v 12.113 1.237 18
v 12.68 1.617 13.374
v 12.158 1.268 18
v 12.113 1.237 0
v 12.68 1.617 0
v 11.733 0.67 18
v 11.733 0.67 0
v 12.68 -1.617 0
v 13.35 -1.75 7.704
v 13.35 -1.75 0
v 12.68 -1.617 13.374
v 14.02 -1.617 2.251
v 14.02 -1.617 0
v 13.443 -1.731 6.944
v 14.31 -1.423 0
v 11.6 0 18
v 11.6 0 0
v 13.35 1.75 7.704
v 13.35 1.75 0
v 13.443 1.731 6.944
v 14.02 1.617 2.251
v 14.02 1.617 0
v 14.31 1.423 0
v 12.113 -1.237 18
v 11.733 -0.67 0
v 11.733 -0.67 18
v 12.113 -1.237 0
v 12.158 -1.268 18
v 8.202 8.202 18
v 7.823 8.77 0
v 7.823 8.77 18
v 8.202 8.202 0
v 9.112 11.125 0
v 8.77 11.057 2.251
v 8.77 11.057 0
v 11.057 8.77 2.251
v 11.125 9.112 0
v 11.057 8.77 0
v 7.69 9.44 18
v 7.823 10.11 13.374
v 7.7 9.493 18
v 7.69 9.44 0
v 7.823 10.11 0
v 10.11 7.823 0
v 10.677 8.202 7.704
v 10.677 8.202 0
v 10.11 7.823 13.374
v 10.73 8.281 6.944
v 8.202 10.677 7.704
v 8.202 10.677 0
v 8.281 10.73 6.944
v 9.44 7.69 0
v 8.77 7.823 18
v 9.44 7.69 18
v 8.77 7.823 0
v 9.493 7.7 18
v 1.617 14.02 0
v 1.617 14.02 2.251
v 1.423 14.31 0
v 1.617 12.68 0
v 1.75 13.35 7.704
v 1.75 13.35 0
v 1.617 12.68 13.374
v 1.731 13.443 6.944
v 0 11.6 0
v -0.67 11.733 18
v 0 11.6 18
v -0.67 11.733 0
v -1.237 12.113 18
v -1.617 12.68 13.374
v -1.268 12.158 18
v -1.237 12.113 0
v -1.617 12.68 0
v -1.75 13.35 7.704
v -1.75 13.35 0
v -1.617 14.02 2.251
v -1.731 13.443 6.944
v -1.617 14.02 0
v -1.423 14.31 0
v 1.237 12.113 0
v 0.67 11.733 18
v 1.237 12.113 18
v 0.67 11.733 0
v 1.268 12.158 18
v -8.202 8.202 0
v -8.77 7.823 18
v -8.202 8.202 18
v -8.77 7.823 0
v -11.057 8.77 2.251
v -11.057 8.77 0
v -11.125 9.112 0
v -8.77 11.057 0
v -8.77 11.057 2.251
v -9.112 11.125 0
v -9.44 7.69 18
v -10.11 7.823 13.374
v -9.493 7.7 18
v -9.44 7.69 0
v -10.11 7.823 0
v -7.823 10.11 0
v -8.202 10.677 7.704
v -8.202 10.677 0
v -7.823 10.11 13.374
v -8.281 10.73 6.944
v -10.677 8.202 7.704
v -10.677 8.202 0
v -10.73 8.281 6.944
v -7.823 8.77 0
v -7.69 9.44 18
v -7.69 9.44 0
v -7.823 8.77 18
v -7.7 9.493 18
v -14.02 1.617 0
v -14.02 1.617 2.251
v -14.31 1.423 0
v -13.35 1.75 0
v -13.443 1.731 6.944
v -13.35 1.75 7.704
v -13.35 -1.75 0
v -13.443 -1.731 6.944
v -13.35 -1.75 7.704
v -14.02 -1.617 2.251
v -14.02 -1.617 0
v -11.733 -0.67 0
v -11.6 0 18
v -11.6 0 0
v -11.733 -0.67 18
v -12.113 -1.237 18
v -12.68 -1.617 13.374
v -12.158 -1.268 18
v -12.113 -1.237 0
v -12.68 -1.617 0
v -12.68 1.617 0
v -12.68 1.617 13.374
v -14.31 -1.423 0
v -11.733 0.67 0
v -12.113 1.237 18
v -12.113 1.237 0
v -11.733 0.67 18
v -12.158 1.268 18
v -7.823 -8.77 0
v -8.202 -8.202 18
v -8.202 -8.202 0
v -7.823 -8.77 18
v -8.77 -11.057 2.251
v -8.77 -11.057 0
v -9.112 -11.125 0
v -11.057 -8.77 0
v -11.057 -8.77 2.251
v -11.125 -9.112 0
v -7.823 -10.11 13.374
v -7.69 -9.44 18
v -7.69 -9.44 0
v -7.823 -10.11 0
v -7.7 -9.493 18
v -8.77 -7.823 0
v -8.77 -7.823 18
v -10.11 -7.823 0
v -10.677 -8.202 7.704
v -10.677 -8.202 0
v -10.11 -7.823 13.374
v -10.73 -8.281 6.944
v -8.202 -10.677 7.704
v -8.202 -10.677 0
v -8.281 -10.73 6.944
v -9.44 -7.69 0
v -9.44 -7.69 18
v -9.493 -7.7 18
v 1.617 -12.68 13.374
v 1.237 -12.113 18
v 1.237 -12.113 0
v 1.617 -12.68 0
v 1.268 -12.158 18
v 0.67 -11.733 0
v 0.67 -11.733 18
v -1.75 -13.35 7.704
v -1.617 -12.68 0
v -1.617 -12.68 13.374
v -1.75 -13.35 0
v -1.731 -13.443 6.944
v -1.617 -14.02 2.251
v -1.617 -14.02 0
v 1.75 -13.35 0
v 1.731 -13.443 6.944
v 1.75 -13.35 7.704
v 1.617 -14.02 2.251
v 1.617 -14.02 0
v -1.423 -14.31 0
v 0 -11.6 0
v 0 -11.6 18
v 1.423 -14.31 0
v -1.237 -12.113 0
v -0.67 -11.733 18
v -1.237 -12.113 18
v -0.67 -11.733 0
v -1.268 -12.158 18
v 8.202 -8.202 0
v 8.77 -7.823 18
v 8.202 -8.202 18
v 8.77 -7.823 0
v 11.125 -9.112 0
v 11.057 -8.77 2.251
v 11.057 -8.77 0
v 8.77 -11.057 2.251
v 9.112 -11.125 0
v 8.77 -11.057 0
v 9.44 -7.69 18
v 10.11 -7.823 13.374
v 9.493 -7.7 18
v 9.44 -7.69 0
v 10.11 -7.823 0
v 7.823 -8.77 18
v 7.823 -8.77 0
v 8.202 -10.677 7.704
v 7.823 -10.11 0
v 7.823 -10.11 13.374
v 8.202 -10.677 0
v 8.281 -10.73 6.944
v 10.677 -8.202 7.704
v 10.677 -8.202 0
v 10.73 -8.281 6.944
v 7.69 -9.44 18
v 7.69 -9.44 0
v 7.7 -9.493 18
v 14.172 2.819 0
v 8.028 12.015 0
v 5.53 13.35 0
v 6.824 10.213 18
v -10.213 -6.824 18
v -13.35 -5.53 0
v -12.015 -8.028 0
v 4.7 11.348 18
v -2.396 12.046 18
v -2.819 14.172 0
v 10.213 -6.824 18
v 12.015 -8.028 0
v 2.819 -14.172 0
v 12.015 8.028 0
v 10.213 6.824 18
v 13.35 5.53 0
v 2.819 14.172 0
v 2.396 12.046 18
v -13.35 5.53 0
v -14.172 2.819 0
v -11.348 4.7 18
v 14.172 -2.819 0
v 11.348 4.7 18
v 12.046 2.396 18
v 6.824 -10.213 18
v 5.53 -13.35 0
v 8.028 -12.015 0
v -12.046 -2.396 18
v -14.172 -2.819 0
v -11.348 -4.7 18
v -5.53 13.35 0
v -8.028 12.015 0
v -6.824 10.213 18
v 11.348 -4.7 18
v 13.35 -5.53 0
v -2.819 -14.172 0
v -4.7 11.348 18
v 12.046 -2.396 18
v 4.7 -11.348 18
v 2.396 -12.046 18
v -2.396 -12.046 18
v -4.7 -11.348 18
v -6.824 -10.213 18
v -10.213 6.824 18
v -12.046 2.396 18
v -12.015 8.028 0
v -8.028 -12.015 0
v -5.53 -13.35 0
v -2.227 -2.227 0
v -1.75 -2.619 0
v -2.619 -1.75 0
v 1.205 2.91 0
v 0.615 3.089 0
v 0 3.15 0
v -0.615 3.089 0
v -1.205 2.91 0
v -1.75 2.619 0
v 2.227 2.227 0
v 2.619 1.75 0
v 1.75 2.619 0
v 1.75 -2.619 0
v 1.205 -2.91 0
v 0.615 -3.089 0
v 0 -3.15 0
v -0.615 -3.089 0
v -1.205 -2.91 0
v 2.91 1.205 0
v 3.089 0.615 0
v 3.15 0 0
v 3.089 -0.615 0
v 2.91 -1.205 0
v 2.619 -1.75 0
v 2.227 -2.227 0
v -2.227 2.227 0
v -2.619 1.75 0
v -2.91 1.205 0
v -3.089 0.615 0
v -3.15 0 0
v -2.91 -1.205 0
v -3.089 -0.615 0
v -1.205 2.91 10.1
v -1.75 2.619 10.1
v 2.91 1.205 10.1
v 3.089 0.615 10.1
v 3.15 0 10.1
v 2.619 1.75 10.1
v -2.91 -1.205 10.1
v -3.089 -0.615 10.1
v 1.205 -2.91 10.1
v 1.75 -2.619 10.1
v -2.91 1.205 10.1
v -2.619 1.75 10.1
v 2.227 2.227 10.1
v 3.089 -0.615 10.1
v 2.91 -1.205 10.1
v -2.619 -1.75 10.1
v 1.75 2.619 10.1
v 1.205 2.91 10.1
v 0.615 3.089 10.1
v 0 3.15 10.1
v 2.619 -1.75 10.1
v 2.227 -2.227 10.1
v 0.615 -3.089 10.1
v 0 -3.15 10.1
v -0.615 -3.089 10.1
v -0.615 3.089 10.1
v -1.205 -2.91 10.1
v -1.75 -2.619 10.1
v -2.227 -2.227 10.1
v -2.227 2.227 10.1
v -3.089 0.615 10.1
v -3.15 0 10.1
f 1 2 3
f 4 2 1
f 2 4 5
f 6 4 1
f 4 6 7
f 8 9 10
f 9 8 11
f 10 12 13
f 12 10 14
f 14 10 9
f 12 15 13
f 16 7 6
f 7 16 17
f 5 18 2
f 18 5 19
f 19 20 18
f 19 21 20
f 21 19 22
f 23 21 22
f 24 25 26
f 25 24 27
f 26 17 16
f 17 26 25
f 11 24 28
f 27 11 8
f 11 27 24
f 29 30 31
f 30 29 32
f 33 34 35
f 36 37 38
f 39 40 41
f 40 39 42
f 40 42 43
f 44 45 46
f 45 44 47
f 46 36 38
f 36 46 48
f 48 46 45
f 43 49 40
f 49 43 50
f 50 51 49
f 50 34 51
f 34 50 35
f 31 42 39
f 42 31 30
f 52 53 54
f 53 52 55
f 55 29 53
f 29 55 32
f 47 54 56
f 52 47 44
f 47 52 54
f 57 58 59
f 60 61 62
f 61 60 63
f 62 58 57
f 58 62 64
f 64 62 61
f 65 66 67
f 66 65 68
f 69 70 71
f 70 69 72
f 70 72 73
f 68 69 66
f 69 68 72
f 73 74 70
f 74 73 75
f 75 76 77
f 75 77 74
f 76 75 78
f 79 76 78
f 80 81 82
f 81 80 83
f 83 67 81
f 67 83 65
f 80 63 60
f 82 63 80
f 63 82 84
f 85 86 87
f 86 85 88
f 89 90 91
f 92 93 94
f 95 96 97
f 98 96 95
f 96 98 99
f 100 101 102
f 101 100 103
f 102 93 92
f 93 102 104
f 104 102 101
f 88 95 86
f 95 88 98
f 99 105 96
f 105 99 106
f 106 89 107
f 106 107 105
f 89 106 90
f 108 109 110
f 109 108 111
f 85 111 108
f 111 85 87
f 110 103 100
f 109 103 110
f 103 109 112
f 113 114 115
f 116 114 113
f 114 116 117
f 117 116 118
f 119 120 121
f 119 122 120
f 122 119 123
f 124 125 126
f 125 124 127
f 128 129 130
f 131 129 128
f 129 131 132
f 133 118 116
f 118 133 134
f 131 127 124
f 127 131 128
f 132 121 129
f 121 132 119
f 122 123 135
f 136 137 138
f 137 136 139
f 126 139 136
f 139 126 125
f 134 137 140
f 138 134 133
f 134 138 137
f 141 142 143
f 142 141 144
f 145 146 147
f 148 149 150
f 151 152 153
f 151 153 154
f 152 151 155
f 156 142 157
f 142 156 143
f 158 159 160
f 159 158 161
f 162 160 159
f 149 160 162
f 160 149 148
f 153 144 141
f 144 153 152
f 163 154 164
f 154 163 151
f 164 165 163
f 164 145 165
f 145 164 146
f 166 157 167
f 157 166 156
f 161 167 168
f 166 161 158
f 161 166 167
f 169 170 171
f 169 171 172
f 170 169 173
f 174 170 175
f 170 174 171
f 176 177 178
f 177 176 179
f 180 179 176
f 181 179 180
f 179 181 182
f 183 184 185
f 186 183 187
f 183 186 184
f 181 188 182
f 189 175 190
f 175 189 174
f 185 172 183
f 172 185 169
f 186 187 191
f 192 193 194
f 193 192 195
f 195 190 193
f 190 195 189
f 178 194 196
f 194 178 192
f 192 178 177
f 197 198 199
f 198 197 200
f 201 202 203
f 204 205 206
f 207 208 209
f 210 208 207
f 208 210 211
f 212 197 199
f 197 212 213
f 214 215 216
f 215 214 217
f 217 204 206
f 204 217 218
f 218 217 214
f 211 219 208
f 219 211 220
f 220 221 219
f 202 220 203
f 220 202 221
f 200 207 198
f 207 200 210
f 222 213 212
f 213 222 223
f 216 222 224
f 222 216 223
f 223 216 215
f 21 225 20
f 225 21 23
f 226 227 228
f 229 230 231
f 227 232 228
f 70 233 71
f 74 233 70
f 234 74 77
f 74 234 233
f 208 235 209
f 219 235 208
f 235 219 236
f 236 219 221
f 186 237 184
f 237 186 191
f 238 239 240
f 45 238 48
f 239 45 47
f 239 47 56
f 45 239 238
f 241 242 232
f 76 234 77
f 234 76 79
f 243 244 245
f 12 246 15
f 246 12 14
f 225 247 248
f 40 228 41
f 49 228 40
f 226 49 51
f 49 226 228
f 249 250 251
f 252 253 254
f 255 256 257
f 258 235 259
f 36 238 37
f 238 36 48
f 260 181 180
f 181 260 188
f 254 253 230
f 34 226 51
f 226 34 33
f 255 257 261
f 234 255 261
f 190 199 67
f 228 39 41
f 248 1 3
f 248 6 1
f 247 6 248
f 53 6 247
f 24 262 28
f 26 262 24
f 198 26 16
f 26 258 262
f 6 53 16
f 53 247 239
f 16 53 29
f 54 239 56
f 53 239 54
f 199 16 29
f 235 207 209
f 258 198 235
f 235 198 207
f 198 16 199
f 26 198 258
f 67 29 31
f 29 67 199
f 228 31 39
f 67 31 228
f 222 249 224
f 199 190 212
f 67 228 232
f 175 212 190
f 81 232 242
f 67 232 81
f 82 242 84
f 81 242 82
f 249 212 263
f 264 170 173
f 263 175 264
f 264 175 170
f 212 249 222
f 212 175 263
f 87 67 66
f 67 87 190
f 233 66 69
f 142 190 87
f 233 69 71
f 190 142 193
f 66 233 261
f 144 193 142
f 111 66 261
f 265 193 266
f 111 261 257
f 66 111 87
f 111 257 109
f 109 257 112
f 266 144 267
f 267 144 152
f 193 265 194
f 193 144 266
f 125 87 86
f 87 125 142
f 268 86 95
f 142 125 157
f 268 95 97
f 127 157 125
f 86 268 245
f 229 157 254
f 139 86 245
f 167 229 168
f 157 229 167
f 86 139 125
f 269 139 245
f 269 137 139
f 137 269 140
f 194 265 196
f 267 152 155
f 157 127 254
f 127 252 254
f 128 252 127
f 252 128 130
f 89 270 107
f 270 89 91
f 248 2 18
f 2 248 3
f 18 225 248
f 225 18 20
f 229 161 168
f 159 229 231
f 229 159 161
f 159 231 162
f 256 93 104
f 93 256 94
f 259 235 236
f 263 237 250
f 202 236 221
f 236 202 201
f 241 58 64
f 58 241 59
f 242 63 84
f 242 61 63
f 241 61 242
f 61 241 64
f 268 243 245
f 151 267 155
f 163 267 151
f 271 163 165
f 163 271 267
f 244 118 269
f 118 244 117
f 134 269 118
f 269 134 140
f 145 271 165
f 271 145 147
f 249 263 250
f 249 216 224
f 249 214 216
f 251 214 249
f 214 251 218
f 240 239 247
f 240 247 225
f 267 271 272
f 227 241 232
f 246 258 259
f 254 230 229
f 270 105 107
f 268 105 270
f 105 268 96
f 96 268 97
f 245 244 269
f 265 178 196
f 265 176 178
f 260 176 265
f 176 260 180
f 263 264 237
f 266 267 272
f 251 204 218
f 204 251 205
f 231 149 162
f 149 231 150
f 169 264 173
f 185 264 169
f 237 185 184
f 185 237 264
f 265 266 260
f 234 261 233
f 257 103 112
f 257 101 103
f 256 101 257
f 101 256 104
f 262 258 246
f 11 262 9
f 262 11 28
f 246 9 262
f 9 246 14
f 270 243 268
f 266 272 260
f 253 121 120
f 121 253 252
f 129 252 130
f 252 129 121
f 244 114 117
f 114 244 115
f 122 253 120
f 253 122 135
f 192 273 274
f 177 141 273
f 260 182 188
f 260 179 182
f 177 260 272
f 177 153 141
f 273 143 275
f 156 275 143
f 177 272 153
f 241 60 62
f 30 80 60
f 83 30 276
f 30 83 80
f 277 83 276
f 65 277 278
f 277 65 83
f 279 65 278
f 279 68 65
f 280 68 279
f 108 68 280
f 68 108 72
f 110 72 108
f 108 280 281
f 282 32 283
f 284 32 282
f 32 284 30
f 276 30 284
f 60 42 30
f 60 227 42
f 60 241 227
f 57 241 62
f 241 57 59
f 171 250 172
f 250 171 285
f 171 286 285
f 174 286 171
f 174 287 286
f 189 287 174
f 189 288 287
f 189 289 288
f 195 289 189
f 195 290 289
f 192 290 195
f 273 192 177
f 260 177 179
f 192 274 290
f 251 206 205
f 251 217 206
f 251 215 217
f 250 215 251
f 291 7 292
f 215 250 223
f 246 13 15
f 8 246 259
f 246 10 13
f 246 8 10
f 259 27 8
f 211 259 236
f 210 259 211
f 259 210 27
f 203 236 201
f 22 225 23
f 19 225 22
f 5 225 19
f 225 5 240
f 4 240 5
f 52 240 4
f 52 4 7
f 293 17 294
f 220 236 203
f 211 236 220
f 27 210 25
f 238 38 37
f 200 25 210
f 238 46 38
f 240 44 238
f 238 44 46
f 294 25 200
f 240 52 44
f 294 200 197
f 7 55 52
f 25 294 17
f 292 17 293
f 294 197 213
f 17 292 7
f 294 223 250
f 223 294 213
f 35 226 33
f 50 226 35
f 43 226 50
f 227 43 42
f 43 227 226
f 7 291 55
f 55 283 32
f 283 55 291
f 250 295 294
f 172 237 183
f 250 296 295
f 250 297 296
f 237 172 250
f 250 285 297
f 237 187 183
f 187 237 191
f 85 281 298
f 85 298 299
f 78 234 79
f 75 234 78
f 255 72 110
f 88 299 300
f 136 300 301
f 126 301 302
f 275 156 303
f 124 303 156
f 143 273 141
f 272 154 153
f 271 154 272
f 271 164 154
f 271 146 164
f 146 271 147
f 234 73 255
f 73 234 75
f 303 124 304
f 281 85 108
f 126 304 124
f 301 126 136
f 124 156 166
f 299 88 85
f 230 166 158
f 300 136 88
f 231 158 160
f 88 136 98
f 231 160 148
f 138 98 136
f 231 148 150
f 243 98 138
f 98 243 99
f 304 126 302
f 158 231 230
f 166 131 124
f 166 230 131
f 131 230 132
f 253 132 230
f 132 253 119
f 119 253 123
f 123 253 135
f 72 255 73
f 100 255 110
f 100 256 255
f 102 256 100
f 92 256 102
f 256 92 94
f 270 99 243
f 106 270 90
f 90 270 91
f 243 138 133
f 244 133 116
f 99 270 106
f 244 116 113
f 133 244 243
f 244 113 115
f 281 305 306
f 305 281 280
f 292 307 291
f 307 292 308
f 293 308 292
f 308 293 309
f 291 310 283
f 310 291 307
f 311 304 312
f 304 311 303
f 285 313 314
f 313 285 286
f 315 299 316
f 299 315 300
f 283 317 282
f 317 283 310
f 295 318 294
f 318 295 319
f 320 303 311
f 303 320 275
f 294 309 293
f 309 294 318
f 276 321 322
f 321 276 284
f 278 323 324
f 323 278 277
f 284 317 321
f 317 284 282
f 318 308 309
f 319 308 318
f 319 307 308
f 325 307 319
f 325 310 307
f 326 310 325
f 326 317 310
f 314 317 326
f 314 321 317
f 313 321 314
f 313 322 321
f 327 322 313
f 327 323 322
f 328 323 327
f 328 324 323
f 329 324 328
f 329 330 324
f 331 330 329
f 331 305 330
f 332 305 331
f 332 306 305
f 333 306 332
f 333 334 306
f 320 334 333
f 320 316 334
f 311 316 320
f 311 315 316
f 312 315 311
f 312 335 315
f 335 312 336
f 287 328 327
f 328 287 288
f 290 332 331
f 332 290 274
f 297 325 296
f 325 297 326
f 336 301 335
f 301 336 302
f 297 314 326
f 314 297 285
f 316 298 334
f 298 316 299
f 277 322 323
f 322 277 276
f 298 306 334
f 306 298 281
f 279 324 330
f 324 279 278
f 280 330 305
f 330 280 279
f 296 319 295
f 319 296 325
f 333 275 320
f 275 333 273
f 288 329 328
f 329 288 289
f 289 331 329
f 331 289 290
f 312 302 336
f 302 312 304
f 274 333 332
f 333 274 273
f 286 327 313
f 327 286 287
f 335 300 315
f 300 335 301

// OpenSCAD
// ACCESS KNOB — Mutable Instruments Frames Large Center Knob
// Generated via CLI for Studio Knobs
module access_knob_mi_frames_center() {
  outer_d = 28.9;
  height = 18;
  taper = 0.85;
  bore_d = 6;
  slot_h = 10;
  tex_depth = 2.2;
  tex_scale = 3.5;
  tex_count = 8;

  difference() {
    cylinder(h=height, d1=outer_d, d2=outer_d*taper, $fn=32);
    translate([0,0,-0.1]) cylinder(h=slot_h+0.2, d=bore_d + 0.3, $fn=32);
    for(i=[0:tex_count-1]) {
      rotate([0,0,i*(360/tex_count)])
        translate([outer_d/2-tex_depth/2, 0, height/2])
          cylinder(h=height*1.1, d=tex_scale, center=true, $fn=16);
    }
  }
}
access_knob_mi_frames_center();
